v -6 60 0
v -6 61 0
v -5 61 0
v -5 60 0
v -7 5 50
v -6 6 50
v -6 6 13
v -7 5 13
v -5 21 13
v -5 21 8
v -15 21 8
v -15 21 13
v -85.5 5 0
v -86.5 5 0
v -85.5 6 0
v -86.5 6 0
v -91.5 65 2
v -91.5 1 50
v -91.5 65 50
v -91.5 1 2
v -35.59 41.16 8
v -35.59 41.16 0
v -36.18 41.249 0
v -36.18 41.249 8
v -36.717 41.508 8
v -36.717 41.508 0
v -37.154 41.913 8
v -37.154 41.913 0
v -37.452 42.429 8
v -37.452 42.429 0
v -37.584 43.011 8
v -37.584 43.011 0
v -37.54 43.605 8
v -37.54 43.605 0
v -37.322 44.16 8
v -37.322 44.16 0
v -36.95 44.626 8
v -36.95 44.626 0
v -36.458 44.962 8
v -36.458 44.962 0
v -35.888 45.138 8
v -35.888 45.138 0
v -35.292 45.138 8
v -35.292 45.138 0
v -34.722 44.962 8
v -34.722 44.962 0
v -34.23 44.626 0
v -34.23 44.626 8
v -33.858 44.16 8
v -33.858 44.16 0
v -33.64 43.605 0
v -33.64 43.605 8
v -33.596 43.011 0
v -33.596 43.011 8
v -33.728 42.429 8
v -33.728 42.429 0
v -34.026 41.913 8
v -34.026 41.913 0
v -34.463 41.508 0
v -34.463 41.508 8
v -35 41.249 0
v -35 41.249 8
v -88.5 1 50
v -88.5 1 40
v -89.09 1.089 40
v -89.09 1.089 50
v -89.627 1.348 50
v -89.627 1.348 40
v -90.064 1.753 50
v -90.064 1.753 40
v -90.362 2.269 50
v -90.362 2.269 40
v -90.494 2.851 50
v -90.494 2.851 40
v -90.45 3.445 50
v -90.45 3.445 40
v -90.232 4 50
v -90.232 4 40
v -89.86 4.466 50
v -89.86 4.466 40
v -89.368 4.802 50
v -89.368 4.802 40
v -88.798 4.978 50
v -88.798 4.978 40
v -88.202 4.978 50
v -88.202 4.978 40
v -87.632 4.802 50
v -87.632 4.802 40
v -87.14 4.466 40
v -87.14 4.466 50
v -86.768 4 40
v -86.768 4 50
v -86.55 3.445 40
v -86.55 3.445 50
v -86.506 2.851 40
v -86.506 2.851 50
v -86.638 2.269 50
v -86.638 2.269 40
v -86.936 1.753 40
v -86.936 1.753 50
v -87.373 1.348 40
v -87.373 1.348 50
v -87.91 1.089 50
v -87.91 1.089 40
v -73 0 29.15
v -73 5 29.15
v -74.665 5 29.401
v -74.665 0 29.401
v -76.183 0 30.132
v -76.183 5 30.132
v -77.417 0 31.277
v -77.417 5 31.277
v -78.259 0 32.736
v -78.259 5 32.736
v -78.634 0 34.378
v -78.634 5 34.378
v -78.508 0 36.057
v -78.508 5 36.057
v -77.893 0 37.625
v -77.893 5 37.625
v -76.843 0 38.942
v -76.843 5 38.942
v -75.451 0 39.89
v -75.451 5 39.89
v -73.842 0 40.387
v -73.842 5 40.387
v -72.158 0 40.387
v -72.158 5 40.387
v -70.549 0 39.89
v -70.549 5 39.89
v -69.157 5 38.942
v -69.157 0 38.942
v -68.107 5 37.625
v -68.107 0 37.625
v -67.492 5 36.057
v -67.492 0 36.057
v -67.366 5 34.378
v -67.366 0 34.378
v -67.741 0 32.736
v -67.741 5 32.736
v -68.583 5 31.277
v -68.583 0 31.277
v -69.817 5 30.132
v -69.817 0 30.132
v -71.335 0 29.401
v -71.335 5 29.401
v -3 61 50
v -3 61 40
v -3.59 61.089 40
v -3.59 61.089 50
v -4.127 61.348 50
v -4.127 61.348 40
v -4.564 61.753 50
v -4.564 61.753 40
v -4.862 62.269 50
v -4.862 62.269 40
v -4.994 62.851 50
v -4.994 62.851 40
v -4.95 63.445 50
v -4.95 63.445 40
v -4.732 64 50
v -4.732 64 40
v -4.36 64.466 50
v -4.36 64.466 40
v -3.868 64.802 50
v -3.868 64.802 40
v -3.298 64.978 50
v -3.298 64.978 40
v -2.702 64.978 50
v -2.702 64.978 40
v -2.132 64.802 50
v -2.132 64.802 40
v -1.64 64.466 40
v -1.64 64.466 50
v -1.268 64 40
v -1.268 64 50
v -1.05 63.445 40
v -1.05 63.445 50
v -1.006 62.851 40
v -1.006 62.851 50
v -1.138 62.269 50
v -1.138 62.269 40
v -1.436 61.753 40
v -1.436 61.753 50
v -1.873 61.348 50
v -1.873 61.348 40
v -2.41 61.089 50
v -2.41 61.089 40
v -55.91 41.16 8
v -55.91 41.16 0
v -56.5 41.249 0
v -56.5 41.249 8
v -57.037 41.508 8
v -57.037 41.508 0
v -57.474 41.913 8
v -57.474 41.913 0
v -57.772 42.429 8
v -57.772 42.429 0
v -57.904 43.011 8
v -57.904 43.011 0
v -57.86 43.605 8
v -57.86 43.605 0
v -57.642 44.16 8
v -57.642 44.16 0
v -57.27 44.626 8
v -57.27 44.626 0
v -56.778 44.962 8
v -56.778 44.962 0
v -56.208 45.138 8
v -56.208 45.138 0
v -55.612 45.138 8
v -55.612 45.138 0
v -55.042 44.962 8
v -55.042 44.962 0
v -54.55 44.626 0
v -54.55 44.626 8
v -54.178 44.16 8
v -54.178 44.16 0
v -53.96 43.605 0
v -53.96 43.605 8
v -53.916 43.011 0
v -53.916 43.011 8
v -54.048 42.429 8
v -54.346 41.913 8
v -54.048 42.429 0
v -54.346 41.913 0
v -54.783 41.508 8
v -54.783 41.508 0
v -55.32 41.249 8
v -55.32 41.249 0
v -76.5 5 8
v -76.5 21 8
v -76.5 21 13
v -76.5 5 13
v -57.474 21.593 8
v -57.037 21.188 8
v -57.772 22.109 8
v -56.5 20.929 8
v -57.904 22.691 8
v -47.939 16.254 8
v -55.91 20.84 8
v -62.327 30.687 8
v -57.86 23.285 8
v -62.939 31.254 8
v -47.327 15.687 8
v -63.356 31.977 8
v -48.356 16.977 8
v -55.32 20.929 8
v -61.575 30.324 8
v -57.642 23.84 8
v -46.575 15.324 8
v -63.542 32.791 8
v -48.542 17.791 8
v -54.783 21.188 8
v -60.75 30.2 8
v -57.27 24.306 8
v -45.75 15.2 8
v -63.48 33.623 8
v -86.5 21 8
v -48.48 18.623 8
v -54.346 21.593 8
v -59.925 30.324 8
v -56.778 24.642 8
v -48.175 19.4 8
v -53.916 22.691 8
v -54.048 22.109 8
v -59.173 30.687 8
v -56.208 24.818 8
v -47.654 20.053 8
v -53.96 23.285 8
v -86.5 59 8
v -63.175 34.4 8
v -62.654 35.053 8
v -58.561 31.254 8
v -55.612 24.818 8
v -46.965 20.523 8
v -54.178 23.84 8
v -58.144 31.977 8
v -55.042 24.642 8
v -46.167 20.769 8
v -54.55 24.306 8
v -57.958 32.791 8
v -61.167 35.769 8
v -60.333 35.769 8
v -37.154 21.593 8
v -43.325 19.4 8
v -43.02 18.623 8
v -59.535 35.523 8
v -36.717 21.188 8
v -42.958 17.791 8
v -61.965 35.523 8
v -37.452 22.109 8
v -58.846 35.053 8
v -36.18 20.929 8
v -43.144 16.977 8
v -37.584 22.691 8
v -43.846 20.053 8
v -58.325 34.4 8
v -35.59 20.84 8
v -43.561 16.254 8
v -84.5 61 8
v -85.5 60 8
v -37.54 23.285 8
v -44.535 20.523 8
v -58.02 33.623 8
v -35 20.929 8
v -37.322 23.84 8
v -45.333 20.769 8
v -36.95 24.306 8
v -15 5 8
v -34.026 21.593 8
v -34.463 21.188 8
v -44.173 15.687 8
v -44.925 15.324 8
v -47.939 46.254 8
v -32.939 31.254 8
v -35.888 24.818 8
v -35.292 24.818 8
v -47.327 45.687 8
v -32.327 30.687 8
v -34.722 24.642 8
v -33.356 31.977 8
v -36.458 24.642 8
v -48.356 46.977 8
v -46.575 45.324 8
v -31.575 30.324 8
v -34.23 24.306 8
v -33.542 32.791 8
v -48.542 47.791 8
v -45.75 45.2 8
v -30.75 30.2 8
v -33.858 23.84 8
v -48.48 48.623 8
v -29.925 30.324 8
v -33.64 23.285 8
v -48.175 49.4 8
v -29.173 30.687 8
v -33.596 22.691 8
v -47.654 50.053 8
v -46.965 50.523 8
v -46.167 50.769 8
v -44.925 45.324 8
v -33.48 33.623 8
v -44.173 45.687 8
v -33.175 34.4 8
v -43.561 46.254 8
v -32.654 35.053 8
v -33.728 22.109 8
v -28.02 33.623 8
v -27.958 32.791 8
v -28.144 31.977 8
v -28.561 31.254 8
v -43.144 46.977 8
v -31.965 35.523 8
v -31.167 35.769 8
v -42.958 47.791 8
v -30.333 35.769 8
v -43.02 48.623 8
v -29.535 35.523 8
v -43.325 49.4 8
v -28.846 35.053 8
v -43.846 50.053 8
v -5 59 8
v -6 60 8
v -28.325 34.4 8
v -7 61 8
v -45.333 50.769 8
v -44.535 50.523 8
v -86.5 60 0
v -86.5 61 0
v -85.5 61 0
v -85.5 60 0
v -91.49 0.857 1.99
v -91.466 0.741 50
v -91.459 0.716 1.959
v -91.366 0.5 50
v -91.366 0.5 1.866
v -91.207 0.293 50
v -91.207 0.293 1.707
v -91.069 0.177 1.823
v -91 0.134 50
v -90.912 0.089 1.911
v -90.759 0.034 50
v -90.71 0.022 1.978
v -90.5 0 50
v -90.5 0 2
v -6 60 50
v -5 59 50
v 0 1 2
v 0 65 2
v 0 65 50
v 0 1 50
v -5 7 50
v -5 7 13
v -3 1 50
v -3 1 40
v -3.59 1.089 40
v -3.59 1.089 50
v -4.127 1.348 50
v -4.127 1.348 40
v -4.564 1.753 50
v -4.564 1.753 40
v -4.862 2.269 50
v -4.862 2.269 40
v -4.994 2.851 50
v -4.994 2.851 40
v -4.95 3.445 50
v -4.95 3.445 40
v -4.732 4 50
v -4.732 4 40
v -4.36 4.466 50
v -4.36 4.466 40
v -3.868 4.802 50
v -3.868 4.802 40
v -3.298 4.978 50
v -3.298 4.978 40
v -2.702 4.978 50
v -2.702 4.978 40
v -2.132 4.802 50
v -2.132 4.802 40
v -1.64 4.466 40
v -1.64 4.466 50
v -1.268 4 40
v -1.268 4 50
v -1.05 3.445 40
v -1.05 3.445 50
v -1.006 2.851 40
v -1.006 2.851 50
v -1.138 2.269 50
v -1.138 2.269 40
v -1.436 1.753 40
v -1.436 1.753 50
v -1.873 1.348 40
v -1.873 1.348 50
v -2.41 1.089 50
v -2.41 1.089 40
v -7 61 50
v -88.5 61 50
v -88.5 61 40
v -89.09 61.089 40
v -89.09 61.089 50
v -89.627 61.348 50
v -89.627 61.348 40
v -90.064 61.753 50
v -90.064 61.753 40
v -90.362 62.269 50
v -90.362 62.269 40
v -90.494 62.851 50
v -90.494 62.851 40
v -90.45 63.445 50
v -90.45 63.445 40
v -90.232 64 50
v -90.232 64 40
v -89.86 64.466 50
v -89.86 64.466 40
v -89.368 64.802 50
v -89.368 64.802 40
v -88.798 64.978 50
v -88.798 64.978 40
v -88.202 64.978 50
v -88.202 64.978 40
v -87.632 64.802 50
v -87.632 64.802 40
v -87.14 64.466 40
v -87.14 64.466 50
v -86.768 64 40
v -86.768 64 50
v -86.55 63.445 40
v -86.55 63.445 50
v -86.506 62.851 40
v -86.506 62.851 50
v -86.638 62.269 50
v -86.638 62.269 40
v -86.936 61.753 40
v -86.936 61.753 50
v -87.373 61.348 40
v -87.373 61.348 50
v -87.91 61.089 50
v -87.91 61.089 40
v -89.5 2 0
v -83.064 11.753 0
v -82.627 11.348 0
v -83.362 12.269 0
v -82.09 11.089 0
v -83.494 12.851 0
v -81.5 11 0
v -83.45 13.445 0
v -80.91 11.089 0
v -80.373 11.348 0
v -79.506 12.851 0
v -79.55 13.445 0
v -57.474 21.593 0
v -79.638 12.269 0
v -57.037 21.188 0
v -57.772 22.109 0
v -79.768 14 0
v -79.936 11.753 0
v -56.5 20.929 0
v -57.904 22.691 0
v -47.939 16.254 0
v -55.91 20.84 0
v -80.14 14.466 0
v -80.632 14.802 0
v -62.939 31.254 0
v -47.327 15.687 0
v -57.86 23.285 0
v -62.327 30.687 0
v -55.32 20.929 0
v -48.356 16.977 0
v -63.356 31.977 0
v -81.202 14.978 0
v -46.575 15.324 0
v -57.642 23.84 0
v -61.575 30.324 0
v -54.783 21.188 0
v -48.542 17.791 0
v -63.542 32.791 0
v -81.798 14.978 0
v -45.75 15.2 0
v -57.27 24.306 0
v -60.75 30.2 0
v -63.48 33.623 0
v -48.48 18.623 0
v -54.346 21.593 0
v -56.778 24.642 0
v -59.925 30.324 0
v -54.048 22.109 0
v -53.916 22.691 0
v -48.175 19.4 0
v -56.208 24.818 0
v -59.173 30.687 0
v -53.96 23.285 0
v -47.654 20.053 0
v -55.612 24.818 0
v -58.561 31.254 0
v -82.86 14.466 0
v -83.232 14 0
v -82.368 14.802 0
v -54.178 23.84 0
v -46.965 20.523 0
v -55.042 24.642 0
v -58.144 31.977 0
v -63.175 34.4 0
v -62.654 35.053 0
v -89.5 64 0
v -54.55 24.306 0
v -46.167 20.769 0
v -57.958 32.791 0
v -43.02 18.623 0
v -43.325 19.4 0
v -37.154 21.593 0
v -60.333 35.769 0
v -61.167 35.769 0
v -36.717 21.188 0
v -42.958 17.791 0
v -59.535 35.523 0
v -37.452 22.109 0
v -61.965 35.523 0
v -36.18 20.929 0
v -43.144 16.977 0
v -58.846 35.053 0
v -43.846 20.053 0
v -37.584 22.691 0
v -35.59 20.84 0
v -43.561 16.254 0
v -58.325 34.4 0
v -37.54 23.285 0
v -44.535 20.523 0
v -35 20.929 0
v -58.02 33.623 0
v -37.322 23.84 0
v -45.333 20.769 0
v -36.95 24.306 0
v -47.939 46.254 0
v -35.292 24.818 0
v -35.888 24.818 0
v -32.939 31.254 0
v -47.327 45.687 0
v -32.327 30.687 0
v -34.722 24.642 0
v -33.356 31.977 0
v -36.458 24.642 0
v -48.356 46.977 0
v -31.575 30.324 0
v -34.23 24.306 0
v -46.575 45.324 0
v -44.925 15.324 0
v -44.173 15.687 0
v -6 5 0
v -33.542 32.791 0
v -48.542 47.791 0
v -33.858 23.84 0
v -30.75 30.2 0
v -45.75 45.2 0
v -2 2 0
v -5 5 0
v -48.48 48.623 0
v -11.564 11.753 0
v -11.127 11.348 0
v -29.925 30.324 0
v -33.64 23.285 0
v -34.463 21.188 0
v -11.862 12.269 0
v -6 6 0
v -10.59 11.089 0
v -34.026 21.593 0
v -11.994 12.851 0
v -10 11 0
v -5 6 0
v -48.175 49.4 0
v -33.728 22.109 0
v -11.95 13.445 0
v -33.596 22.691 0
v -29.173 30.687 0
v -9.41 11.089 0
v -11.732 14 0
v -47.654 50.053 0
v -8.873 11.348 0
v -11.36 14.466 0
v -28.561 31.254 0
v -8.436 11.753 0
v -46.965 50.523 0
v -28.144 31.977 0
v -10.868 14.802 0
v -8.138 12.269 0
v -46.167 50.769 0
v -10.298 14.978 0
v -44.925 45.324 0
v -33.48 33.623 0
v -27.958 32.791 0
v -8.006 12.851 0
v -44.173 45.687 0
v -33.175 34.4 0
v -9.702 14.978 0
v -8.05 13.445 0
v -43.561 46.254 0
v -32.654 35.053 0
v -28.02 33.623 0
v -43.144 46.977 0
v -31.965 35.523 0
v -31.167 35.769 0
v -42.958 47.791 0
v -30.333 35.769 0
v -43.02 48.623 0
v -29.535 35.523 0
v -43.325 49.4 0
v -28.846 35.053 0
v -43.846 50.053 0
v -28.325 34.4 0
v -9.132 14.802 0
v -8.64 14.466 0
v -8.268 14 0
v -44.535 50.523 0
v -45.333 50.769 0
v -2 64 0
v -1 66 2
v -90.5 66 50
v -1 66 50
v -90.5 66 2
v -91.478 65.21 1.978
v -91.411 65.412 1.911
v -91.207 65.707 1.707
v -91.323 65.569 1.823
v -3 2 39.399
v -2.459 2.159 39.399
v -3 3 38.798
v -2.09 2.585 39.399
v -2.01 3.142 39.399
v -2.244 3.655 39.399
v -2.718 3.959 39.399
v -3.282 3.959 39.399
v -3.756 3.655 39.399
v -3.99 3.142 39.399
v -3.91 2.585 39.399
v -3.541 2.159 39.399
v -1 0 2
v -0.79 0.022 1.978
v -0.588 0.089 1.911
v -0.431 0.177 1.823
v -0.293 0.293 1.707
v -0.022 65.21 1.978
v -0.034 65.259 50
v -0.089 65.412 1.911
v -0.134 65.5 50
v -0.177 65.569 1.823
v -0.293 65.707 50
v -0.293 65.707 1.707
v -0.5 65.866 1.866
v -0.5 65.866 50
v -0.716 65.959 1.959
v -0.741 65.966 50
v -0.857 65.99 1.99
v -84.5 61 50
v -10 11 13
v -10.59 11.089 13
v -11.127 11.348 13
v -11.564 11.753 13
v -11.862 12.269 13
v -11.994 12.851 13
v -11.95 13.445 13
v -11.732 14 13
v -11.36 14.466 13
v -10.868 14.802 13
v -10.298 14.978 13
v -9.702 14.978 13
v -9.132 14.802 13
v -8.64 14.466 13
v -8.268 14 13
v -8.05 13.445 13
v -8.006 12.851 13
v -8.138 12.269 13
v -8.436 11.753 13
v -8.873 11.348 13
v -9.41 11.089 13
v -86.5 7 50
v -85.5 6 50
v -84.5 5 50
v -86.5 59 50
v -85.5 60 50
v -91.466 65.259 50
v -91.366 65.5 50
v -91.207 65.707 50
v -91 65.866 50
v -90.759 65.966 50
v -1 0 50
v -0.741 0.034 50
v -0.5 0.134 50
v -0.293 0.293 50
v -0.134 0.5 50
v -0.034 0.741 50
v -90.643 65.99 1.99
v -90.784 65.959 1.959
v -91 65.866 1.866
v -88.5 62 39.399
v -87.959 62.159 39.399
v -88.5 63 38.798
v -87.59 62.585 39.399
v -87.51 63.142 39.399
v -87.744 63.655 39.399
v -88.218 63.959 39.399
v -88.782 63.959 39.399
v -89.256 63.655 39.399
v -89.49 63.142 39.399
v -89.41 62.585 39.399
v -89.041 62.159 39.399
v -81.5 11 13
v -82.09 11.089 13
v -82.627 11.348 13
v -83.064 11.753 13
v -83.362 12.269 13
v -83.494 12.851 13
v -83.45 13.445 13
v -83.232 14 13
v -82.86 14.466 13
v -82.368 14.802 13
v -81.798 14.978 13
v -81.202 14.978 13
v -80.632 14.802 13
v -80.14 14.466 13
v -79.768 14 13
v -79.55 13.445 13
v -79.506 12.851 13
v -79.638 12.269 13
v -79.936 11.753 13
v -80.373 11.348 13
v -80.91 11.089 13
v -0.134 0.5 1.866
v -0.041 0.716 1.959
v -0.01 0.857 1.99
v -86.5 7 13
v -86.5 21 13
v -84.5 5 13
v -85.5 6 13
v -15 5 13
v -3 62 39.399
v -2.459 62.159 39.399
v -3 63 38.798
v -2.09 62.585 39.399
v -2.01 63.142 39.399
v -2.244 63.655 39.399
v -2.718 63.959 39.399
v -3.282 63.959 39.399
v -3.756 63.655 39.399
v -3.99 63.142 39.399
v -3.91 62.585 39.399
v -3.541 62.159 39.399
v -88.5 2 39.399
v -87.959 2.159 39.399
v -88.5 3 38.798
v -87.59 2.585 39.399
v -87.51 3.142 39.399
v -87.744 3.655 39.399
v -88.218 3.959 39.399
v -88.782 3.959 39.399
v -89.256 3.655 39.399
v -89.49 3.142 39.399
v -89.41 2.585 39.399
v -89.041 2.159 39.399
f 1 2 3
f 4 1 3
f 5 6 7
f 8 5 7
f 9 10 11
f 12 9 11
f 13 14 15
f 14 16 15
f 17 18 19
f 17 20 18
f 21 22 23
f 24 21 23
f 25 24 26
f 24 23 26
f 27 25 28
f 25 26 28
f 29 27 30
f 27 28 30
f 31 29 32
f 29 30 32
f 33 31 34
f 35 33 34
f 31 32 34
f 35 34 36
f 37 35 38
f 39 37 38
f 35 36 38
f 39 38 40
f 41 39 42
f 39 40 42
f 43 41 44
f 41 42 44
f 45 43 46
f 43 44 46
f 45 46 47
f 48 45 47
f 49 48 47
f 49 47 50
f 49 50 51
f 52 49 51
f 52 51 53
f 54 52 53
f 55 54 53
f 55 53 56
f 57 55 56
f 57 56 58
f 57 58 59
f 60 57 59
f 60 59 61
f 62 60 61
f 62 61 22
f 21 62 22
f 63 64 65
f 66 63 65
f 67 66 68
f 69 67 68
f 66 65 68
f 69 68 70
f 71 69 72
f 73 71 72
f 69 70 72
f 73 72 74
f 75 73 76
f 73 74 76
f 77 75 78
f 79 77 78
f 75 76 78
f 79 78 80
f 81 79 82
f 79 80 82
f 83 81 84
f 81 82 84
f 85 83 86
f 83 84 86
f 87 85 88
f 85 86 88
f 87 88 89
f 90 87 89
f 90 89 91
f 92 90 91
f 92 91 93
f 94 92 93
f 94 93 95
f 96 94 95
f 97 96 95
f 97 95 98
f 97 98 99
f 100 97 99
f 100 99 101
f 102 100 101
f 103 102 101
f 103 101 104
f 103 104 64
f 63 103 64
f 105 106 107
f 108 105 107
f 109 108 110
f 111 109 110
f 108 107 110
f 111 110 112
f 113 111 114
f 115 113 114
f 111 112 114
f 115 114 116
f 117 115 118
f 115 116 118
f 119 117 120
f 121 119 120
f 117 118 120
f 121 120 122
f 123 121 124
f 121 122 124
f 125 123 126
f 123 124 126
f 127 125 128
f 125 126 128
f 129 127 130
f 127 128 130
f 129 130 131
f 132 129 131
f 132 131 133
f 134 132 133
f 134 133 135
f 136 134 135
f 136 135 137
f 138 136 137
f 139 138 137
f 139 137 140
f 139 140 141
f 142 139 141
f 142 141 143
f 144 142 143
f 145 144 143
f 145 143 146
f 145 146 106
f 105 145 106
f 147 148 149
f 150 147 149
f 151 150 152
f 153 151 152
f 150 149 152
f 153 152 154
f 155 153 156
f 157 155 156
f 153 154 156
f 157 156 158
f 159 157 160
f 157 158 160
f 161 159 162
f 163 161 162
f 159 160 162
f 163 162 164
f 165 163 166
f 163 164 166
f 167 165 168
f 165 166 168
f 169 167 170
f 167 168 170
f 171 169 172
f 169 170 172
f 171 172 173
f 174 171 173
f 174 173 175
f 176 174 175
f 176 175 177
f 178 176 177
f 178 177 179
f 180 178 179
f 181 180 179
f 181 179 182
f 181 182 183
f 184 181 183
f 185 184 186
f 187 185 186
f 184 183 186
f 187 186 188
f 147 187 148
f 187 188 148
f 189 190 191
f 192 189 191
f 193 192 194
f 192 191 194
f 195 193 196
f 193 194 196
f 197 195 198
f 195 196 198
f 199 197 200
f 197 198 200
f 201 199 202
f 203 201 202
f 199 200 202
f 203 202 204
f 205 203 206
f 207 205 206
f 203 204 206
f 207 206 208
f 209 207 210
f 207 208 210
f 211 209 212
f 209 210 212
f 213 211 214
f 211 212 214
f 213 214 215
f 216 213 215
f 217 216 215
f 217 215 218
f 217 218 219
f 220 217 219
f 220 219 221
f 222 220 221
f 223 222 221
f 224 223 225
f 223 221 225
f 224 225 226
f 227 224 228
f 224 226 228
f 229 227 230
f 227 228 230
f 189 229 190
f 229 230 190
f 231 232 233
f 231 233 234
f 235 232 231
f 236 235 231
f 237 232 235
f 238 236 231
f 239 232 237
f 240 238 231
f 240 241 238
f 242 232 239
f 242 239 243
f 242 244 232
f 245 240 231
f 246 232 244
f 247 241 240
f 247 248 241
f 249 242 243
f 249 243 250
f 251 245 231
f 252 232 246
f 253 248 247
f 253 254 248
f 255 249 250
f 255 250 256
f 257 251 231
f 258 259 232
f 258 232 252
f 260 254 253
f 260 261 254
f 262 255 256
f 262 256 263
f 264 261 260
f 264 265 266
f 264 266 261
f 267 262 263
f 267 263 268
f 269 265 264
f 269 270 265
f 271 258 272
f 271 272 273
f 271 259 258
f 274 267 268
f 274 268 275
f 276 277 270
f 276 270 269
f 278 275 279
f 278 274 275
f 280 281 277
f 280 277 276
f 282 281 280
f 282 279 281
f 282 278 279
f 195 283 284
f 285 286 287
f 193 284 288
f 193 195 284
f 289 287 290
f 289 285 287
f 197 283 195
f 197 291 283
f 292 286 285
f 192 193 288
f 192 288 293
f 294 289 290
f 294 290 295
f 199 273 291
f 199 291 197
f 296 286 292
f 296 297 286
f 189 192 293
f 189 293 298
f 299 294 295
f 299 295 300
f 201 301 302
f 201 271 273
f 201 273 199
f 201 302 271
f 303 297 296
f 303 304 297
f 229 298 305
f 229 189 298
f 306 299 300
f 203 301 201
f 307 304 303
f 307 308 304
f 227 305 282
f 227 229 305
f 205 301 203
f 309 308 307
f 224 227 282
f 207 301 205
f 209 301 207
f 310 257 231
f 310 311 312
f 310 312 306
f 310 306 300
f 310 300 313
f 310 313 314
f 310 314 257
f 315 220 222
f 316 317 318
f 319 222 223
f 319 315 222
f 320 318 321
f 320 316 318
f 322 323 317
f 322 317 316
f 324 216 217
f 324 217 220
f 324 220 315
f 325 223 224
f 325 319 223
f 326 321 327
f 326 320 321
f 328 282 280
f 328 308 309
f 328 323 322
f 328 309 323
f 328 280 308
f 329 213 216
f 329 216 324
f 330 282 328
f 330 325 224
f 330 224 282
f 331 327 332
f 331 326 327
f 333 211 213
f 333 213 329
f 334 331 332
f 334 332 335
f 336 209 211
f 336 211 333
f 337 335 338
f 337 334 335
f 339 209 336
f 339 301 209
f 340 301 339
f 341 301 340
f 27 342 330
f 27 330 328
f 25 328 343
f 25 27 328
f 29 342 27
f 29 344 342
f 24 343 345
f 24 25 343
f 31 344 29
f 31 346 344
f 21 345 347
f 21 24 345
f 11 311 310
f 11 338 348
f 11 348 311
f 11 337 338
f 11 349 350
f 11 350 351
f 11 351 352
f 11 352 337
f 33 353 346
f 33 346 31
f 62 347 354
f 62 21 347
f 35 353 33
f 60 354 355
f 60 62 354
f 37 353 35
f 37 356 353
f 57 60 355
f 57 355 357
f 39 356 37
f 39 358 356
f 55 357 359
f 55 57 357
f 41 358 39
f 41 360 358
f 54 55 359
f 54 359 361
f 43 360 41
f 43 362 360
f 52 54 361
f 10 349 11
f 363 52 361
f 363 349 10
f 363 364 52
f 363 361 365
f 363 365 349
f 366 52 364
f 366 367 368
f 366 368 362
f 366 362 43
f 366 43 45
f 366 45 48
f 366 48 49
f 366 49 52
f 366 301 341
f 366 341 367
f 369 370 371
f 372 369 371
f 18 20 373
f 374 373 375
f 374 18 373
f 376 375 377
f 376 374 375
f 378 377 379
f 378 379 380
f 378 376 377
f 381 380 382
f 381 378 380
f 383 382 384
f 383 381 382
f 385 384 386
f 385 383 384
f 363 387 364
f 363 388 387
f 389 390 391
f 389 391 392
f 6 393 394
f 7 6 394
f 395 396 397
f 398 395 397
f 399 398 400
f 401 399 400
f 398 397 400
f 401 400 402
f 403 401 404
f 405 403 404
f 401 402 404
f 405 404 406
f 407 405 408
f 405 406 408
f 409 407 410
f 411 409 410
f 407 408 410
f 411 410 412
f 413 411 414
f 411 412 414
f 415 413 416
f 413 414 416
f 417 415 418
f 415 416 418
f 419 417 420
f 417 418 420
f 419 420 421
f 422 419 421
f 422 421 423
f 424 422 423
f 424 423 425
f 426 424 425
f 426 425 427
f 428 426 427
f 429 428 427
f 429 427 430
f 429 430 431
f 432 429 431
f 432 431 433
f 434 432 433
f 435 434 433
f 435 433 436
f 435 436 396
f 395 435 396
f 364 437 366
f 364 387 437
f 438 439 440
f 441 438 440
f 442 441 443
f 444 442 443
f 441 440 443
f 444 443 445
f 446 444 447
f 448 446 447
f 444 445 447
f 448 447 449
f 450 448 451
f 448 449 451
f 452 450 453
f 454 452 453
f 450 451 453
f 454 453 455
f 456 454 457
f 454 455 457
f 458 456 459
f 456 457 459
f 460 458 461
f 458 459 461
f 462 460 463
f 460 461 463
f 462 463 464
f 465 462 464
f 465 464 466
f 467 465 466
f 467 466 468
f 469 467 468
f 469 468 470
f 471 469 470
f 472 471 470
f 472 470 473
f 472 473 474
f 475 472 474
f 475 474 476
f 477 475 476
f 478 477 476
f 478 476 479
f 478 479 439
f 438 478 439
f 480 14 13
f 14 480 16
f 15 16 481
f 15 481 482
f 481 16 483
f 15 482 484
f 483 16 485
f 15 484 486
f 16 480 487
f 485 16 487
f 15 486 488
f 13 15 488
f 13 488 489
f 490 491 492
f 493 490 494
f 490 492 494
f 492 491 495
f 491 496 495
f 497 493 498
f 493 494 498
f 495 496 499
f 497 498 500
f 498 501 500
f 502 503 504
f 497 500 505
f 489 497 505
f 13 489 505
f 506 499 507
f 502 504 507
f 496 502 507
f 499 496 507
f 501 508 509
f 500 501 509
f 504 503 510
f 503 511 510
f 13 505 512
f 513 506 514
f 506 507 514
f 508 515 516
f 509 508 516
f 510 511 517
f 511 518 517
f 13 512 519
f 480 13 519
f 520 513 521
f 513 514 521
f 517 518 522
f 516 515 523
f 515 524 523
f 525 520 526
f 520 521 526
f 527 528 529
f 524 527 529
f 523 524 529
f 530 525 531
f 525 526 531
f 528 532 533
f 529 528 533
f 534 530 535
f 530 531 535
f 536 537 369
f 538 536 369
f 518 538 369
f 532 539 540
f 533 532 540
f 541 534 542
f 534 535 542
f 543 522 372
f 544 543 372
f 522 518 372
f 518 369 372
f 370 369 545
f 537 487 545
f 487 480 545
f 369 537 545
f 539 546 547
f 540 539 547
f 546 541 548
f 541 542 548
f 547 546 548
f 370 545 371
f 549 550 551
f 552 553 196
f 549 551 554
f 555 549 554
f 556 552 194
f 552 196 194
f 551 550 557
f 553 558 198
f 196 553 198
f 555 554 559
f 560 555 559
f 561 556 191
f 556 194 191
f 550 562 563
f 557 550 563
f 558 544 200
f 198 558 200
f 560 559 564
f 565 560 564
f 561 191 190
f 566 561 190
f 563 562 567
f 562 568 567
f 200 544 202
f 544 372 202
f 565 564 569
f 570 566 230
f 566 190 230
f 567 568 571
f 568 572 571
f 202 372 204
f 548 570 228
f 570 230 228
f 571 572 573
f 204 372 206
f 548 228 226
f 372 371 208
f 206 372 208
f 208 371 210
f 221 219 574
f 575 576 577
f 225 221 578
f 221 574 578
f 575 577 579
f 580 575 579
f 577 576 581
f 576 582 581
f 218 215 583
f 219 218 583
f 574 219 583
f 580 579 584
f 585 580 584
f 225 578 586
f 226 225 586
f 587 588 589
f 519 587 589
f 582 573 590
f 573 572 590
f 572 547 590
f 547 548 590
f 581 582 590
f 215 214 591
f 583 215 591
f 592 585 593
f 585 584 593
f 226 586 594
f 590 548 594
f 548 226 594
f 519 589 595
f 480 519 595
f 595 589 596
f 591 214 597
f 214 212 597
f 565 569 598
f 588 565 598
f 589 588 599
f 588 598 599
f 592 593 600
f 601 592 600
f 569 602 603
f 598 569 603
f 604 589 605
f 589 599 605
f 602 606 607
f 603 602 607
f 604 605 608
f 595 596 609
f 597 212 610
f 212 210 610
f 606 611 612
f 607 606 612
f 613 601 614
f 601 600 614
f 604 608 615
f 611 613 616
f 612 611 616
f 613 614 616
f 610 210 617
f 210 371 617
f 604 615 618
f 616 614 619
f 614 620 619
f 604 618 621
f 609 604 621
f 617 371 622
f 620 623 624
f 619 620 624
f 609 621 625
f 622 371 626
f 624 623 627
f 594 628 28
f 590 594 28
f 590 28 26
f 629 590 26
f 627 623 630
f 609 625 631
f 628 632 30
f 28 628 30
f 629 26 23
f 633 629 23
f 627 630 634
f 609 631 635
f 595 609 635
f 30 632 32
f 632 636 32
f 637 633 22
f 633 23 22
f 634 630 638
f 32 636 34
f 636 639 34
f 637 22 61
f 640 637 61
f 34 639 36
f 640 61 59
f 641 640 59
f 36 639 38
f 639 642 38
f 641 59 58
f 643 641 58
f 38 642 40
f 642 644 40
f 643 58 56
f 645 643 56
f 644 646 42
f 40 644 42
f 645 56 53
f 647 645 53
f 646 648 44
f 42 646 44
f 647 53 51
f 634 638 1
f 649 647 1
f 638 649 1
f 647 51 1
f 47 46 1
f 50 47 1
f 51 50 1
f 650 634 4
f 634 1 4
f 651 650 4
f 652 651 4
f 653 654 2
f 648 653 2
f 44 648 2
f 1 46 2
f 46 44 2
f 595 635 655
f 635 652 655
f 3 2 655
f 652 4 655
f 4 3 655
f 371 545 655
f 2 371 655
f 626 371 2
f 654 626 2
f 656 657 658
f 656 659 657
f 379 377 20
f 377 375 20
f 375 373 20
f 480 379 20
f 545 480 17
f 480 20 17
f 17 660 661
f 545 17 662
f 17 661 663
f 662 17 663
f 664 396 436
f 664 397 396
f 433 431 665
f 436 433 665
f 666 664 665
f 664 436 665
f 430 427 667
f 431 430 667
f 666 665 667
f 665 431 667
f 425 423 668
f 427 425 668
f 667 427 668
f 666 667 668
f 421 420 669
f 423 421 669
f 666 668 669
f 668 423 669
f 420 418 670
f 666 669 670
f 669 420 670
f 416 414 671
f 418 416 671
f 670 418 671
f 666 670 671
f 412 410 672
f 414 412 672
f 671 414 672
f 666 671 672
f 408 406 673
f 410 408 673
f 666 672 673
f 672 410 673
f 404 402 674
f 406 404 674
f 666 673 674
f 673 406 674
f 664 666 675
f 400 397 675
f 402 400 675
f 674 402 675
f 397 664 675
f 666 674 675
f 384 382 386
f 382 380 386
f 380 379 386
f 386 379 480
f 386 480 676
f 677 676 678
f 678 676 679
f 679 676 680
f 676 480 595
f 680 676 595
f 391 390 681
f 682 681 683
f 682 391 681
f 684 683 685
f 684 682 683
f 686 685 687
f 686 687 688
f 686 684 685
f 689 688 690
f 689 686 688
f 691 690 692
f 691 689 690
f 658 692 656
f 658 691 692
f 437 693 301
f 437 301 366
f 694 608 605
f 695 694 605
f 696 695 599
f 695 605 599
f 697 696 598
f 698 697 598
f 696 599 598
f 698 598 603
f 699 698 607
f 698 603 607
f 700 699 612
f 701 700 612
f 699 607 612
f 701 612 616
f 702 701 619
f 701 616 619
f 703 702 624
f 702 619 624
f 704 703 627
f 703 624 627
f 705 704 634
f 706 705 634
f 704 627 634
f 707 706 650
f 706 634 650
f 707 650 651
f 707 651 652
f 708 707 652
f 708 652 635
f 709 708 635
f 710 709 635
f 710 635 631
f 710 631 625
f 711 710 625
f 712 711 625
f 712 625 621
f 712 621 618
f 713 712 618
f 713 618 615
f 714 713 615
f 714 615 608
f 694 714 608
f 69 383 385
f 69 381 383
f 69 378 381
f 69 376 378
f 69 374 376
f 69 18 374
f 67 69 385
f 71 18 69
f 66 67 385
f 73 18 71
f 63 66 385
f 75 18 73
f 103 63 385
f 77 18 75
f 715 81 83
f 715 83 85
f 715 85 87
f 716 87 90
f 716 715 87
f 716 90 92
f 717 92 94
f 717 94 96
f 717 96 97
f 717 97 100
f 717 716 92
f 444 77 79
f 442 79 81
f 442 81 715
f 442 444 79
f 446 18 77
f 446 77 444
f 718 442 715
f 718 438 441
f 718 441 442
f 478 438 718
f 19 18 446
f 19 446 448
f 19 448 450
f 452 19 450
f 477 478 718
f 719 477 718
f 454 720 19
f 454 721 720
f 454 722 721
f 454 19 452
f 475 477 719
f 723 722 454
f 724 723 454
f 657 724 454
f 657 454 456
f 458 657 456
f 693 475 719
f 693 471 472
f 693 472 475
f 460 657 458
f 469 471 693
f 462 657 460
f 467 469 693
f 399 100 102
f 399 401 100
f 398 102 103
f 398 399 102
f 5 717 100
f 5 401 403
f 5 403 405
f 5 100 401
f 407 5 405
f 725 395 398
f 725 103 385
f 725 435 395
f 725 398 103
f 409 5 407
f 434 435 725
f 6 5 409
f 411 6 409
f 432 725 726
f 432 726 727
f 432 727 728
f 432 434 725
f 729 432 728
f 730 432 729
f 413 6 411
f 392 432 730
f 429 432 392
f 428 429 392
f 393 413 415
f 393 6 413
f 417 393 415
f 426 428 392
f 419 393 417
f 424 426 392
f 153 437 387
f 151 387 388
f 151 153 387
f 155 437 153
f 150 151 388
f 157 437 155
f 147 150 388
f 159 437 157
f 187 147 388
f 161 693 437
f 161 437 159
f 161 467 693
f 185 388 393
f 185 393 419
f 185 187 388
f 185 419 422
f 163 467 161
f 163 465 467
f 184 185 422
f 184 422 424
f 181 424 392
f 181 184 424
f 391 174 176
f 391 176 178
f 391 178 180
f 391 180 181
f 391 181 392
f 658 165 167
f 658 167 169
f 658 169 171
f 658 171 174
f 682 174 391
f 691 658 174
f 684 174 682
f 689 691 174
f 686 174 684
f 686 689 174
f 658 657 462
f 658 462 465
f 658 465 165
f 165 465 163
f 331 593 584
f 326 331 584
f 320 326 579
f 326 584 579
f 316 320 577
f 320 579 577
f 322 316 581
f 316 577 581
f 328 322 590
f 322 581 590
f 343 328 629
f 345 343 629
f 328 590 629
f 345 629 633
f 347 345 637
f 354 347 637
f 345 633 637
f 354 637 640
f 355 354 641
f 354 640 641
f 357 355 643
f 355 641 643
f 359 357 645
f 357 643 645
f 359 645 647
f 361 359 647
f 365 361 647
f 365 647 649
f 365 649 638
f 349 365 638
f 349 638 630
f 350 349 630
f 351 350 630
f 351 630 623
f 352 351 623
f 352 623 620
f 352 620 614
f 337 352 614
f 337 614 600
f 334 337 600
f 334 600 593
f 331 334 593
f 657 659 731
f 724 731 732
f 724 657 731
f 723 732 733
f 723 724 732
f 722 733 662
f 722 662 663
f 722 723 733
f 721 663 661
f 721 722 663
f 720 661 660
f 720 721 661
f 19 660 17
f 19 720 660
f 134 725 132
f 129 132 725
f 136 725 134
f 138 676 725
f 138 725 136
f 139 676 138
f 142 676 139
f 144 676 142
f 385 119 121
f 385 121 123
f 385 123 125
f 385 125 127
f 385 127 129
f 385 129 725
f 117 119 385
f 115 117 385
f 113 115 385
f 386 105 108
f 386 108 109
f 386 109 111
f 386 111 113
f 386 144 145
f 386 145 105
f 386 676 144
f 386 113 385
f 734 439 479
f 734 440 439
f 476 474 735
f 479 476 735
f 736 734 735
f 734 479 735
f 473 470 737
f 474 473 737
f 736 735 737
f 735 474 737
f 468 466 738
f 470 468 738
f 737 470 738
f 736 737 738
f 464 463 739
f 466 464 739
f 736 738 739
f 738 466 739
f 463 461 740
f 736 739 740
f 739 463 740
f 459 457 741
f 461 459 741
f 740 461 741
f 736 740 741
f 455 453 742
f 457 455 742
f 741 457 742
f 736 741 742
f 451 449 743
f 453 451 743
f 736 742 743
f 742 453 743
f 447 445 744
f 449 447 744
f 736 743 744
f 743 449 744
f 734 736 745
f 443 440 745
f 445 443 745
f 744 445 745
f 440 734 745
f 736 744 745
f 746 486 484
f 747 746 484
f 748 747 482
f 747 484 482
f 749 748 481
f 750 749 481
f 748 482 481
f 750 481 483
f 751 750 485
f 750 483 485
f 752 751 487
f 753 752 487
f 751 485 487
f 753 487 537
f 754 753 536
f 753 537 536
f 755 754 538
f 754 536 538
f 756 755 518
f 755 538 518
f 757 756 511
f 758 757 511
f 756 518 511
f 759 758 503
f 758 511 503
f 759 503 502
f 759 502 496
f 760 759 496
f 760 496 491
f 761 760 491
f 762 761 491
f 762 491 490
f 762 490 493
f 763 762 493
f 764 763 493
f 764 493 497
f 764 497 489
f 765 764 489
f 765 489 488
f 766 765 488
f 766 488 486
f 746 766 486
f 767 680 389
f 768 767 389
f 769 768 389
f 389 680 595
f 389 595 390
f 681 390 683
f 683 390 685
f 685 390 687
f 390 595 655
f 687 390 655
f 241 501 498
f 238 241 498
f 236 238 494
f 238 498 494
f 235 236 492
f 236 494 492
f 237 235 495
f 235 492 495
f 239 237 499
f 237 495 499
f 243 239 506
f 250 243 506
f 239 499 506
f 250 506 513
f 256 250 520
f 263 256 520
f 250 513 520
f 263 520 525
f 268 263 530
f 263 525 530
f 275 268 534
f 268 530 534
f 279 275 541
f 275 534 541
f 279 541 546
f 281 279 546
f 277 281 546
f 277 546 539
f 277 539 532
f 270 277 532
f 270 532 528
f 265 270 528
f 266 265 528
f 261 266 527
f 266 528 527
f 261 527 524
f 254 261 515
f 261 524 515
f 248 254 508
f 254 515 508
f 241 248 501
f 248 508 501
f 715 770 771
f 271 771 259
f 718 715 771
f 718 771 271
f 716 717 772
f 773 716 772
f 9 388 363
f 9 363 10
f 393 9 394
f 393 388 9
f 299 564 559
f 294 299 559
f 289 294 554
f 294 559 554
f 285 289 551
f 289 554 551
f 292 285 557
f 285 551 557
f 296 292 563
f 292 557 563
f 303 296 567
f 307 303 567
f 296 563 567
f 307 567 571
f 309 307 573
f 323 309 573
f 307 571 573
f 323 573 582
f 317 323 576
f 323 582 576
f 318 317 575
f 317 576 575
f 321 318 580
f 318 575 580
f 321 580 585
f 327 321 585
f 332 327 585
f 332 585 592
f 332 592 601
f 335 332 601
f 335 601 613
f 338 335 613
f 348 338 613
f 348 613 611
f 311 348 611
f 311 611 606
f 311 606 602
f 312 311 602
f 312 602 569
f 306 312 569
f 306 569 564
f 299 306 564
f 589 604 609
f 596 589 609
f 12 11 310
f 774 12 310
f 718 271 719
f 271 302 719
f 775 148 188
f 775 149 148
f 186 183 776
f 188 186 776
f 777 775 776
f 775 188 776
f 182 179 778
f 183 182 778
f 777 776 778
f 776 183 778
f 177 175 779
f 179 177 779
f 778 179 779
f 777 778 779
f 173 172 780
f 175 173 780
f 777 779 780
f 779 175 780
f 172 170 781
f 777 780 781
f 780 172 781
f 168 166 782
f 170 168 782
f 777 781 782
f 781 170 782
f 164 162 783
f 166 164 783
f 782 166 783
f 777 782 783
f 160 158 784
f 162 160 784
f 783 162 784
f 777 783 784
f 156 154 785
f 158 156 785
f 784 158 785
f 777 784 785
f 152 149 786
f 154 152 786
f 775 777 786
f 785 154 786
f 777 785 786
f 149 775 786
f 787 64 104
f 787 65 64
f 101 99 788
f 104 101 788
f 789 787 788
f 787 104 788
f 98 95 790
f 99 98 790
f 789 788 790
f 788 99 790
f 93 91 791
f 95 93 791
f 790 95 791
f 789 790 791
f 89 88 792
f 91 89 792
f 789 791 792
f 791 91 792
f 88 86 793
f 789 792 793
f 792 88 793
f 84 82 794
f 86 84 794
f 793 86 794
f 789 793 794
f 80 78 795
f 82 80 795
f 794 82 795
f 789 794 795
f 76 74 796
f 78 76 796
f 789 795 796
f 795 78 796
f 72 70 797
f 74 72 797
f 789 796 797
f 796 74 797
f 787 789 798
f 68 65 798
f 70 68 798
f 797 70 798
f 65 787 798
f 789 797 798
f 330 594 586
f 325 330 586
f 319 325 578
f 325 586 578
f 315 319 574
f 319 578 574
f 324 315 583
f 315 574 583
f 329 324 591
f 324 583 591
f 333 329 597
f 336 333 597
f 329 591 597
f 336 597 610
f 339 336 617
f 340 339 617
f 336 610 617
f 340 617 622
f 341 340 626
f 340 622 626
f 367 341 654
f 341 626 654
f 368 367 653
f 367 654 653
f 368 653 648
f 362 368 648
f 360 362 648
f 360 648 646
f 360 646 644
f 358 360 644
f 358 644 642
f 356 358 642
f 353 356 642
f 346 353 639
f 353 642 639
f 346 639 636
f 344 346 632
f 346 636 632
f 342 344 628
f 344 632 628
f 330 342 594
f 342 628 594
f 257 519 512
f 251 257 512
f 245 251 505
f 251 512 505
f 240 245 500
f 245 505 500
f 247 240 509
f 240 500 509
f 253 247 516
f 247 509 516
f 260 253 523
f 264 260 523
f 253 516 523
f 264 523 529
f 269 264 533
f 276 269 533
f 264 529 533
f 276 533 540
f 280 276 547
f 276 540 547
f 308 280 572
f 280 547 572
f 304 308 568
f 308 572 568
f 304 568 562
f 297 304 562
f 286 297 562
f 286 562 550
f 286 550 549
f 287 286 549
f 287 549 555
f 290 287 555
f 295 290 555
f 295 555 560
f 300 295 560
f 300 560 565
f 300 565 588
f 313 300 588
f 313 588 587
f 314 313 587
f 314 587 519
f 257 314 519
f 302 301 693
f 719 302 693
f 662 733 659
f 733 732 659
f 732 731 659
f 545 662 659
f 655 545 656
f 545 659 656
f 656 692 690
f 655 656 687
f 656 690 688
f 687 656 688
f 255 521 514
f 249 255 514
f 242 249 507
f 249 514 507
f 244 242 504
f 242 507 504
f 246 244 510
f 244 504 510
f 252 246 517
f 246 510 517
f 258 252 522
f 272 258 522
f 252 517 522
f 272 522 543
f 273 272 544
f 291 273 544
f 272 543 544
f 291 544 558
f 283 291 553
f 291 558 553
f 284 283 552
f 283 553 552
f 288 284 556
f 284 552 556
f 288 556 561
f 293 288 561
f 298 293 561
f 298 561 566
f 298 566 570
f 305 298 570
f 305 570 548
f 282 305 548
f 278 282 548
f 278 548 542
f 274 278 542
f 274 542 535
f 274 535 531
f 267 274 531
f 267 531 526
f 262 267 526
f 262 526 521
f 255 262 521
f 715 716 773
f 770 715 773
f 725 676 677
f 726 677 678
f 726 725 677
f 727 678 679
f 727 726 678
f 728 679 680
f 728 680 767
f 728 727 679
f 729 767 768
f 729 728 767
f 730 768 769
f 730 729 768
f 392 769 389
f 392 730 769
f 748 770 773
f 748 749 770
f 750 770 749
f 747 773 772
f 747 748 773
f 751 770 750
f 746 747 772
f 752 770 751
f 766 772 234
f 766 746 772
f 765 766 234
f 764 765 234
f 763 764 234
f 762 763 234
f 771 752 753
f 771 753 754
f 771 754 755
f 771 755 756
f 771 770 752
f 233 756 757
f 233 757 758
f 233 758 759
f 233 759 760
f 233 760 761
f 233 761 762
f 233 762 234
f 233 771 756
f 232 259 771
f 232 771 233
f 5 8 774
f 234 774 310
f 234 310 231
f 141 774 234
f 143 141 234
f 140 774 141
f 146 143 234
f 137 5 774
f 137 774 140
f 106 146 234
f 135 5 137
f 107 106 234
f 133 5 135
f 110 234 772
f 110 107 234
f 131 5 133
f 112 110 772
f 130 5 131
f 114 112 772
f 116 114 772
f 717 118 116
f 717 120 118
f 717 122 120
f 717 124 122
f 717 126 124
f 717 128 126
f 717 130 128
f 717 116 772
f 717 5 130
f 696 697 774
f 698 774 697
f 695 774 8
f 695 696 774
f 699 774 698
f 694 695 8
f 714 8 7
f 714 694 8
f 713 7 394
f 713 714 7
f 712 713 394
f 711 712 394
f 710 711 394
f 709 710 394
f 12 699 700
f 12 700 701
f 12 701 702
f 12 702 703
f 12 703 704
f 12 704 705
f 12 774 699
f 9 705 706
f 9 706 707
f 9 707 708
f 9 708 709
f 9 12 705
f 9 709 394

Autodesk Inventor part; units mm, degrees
ref_plane "YZ Plane" through (0, 0, 0) normal (1, 0, 0) x (0, 1, 0)
ref_plane "XZ Plane" through (0, 0, 0) normal (0, 1, 0) x (-1, 0, 0)
ref_plane "XY Plane" through (0, 0, 0) normal (0, 0, 1) x (1, 0, 0)
sketch "Sketch1" plane through (0, 0, 0) normal (0, 0, 1) x (1, 0, 0)
  line L0 (0, 0) -> (-91.5, 0)
  line L1 (-91.5, 0) -> (-91.5, 66)
  line L2 (-91.5, 66) -> (0, 66)
  line L3 (0, 66) -> (0, 0)
  point P0 (-45.75, 66)
  dimension "d1" = 66
  dimension "d2" = 91.5
extrude "Extrusion1" add sketch "Sketch1" along normal blind 50
sketch "Sketch2" plane through (0, 0, 50) normal (0, 0, 1) x (1, 0, 0)
  line L0 (-86.5, 61) -> (-5, 61)
  line L1 (-5, 61) -> (-5, 5)
  line L2 (-5, 5) -> (-86.5, 5)
  line L3 (-86.5, 5) -> (-86.5, 61)
  line L4 (0, 66) -> (-91.5, 66) projected
  line L5 (0, 0) -> (0, 66) projected
  line L6 (-91.5, 0) -> (0, 0) projected
  line L7 (-91.5, 66) -> (-91.5, 0) projected
  dimension "d5" = 5
  dimension "d6" = 5
  dimension "d7" = 5
  dimension "d8" = 5
extrude "Extrusion2" cut sketch "Sketch2" against normal blind 42 contours L0 L1 L2 L3
sketch "Sketch3" plane through (0, 0, 8) normal (0, 0, 1) x (1, 0, 0)
  line L0 (-5, 5) -> (-86.5, 5) projected
  line L1 (-86.5, 61) -> (-5, 61) projected
  line L2 (-86.5, 5) -> (-5, 61)
  line L3 (-5, 5) -> (-86.5, 61)
  line L4 (-45.75, 48) -> (-60.75, 33)
  line L5 (-60.75, 33) -> (-45.75, 18)
  line L6 (-45.75, 18) -> (-30.75, 33)
  line L7 (-45.75, 48) -> (-45.75, 18)
  line L8 (-30.75, 33) -> (-60.75, 33)
  line L9 (-45.75, 48) -> (-30.75, 33)
  line L10 (-45.75, 33) -> (-45.75, 61)
  point P0 (0, 0)
  dimension "d11" = 30
hole "Hole1" at (-45.75, 48, 8) at (-60.75, 33, 8) at (-45.75, 18, 8) at (-30.75, 33, 8) direction (0, 0, -1) diameter 5.6 end through all
sketch "Sketch5" plane through (0, 0, 8) normal (0, 0, 1) x (1, 0, 0)
  line L0 (-55.91, 43.16) -> (-35.59, 43.16)
  line L1 (-35.59, 43.16) -> (-35.59, 22.84)
  line L2 (-35.59, 22.84) -> (-55.91, 22.84)
  line L3 (-55.91, 22.84) -> (-55.91, 43.16)
  line L4 (-35.59, 43.16) -> (-55.91, 22.84)
  line L5 (-55.91, 43.16) -> (-35.59, 22.84)
  line L6 (-86.5, 61) -> (-5, 61) projected
  line L7 (-5, 5) -> (-86.5, 5) projected
  line L8 (-86.5, 61) -> (-5, 5)
  line L9 (-5, 61) -> (-86.5, 5)
  point P0 (0, 0)
  point P1 (-45.75, 33)
  dimension "d26" = 20.32
  dimension "d27" = 20.32
hole "Hole3" at (-55.91, 43.16, 8) at (-35.59, 43.16, 8) at (-35.59, 22.84, 8) at (-55.91, 22.84, 8) direction (0, 0, -1) diameter 4 depth 8 tip angle 118
sketch "Sketch6" plane through (0, 0, 50) normal (0, 0, 1) x (1, 0, 0)
  line L0 (-5, 5) -> (-86.5, 5) projected
  line L1 (-86.5, 5) -> (-85.5, 5)
  line L2 (-85.5, 5) -> (-85.5, 6)
  line L3 (-85.5, 6) -> (-86.5, 6)
  line L4 (-86.5, 6) -> (-86.5, 5)
  line L5 (-5, 61) -> (-5, 5) projected
  line L6 (-5, 6) -> (-6, 6)
  line L7 (-6, 6) -> (-6, 5)
  line L8 (-6, 5) -> (-5, 5)
  line L9 (-5, 5) -> (-5, 6)
  line L10 (-5, 60) -> (-6, 60)
  line L11 (-6, 60) -> (-6, 61)
  line L12 (-6, 61) -> (-5, 61)
  line L13 (-5, 61) -> (-5, 60)
  line L14 (-85.5, 61) -> (-86.5, 61)
  line L15 (-86.5, 61) -> (-86.5, 60)
  line L16 (-86.5, 60) -> (-85.5, 60)
  line L17 (-85.5, 60) -> (-85.5, 61)
  point P0 (0, 0)
  point P1 (-85.5, 5.5)
  dimension "d35" = 1
  dimension "d36" = 1
  dimension "d37" = 1
  dimension "d38" = 1
  dimension "d39" = 1
  dimension "d40" = 1
  dimension "d41" = 1
extrude "Extrusion3" add sketch "Sketch6" against normal through all
sketch "Sketch7" plane through (0, 0, 50) normal (0, 0, 1) x (1, 0, 0)
  line L0 (-85.5, 60) -> (-86.5, 60) projected
  line L1 (-91.5, 66) -> (-91.5, 0) projected
  line L2 (-85.5, 60) -> (-91.5, 66)
  line L3 (-85.5, 5) -> (-85.5, 6) projected
  line L4 (-85.5, 6) -> (-91.5, 0)
  line L5 (0, 0) -> (-6, 6)
  line L6 (0, 66) -> (-91.5, 66) projected
  line L7 (-6, 60) -> (-6, 61) projected
  line L8 (0, 66) -> (-6, 60)
  line L9 (0, 0) -> (0, 66) projected
  line L10 (-91.5, 0) -> (0, 0) projected
  point P0 (-3, 63)
  point P1 (-88.5, 63)
  point P2 (-88.5, 3)
  point P3 (-3, 3)
  point P4 (-3, 3)
  dimension "d44" = 3
  dimension "d45" = 3
hole "Hole4" at (-3, 63, 50) at (-88.5, 63, 50) at (-88.5, 3, 50) at (-3, 3, 50) direction (0, 0, -1) diameter 4 depth 10 tip angle 118
sketch "Sketch8" plane through (-91.5, 0, 0) normal (0, -1, 0) x (1, 0, 0)
  line L0 (91.5, 0) -> (91.5, 50) projected
  line L1 (0, 0) -> (91.5, 0) projected
  point P0 (18.5, 34.8)
  point P1 (91.5, 25)
  dimension "d75" = 73
  dimension "d76" = 34.8
hole "Hole5" at (-73, 0, 34.8) direction (0, 1, 0) diameter 11.3 depth 10 tip angle 118
sketch "Sketch10" plane through (0, 0, 8) normal (0, 0, 1) x (1, 0, 0)
  line L0 (-6, 5) -> (-85.5, 5) projected
  line L1 (-86.5, 6) -> (-86.5, 60) projected
  line L2 (-76.5, 5) -> (-86.5, 5)
  line L3 (-86.5, 5) -> (-86.5, 33)
  line L4 (-86.5, 21) -> (-76.5, 21)
  line L5 (-76.5, 21) -> (-76.5, 5)
  line L6 (-5, 60) -> (-5, 6) projected
  line L7 (-15, 5) -> (-5, 5)
  line L8 (-5, 5) -> (-5, 33)
  line L9 (-5, 21) -> (-15, 21)
  line L10 (-15, 21) -> (-15, 5)
  point P0 (0, 0)
  point P1 (-5, 21)
  dimension "d71" = 10
  dimension "d72" = 10
  dimension "d85" = 16
  dimension "d86" = 16
extrude "Extrusion4" add sketch "Sketch10" along normal blind 5
sketch "Sketch9" plane through (0, 0, 8) normal (0, 0, 1) x (1, 0, 0)
  line L0 (-6, 5) -> (-85.5, 5) projected
  line L1 (-86.5, 6) -> (-86.5, 60) projected
  point P0 (0, 0)
  point P1 (-10, 13)
  point P2 (-81.5, 13)
  dimension "d67" = 8
  dimension "d68" = 8
  dimension "d69" = 71.5
  dimension "d70" = 5
hole "Hole6" at (-10, 13, 8) at (-81.5, 13, 8) direction (0, 0, -1) diameter 4 end through all both
chamfer "Chamfer1" distance 2 angle 45 4 edges at (-45.75, 0, 0) (-91.5, 33, 0) (-45.75, 66, 0) (0, 33, 0)
fillet "Fillet2" radius 1 4 edges at (0, 0, 26) (-91.5, 0, 26) (-91.5, 66, 26) (0, 66, 26)
chamfer "Chamfer2" distance 1 angle 45 8 edges at (-86.5, 6, 31.5) (-85.5, 5, 31.5) (-86.5, 60, 29) (-85.5, 61, 29) (-6, 5, 31.5) (-5, 6, 31.5) (-6, 61, 29) (-5, 60, 29)
properties part number "boitierPCB"
